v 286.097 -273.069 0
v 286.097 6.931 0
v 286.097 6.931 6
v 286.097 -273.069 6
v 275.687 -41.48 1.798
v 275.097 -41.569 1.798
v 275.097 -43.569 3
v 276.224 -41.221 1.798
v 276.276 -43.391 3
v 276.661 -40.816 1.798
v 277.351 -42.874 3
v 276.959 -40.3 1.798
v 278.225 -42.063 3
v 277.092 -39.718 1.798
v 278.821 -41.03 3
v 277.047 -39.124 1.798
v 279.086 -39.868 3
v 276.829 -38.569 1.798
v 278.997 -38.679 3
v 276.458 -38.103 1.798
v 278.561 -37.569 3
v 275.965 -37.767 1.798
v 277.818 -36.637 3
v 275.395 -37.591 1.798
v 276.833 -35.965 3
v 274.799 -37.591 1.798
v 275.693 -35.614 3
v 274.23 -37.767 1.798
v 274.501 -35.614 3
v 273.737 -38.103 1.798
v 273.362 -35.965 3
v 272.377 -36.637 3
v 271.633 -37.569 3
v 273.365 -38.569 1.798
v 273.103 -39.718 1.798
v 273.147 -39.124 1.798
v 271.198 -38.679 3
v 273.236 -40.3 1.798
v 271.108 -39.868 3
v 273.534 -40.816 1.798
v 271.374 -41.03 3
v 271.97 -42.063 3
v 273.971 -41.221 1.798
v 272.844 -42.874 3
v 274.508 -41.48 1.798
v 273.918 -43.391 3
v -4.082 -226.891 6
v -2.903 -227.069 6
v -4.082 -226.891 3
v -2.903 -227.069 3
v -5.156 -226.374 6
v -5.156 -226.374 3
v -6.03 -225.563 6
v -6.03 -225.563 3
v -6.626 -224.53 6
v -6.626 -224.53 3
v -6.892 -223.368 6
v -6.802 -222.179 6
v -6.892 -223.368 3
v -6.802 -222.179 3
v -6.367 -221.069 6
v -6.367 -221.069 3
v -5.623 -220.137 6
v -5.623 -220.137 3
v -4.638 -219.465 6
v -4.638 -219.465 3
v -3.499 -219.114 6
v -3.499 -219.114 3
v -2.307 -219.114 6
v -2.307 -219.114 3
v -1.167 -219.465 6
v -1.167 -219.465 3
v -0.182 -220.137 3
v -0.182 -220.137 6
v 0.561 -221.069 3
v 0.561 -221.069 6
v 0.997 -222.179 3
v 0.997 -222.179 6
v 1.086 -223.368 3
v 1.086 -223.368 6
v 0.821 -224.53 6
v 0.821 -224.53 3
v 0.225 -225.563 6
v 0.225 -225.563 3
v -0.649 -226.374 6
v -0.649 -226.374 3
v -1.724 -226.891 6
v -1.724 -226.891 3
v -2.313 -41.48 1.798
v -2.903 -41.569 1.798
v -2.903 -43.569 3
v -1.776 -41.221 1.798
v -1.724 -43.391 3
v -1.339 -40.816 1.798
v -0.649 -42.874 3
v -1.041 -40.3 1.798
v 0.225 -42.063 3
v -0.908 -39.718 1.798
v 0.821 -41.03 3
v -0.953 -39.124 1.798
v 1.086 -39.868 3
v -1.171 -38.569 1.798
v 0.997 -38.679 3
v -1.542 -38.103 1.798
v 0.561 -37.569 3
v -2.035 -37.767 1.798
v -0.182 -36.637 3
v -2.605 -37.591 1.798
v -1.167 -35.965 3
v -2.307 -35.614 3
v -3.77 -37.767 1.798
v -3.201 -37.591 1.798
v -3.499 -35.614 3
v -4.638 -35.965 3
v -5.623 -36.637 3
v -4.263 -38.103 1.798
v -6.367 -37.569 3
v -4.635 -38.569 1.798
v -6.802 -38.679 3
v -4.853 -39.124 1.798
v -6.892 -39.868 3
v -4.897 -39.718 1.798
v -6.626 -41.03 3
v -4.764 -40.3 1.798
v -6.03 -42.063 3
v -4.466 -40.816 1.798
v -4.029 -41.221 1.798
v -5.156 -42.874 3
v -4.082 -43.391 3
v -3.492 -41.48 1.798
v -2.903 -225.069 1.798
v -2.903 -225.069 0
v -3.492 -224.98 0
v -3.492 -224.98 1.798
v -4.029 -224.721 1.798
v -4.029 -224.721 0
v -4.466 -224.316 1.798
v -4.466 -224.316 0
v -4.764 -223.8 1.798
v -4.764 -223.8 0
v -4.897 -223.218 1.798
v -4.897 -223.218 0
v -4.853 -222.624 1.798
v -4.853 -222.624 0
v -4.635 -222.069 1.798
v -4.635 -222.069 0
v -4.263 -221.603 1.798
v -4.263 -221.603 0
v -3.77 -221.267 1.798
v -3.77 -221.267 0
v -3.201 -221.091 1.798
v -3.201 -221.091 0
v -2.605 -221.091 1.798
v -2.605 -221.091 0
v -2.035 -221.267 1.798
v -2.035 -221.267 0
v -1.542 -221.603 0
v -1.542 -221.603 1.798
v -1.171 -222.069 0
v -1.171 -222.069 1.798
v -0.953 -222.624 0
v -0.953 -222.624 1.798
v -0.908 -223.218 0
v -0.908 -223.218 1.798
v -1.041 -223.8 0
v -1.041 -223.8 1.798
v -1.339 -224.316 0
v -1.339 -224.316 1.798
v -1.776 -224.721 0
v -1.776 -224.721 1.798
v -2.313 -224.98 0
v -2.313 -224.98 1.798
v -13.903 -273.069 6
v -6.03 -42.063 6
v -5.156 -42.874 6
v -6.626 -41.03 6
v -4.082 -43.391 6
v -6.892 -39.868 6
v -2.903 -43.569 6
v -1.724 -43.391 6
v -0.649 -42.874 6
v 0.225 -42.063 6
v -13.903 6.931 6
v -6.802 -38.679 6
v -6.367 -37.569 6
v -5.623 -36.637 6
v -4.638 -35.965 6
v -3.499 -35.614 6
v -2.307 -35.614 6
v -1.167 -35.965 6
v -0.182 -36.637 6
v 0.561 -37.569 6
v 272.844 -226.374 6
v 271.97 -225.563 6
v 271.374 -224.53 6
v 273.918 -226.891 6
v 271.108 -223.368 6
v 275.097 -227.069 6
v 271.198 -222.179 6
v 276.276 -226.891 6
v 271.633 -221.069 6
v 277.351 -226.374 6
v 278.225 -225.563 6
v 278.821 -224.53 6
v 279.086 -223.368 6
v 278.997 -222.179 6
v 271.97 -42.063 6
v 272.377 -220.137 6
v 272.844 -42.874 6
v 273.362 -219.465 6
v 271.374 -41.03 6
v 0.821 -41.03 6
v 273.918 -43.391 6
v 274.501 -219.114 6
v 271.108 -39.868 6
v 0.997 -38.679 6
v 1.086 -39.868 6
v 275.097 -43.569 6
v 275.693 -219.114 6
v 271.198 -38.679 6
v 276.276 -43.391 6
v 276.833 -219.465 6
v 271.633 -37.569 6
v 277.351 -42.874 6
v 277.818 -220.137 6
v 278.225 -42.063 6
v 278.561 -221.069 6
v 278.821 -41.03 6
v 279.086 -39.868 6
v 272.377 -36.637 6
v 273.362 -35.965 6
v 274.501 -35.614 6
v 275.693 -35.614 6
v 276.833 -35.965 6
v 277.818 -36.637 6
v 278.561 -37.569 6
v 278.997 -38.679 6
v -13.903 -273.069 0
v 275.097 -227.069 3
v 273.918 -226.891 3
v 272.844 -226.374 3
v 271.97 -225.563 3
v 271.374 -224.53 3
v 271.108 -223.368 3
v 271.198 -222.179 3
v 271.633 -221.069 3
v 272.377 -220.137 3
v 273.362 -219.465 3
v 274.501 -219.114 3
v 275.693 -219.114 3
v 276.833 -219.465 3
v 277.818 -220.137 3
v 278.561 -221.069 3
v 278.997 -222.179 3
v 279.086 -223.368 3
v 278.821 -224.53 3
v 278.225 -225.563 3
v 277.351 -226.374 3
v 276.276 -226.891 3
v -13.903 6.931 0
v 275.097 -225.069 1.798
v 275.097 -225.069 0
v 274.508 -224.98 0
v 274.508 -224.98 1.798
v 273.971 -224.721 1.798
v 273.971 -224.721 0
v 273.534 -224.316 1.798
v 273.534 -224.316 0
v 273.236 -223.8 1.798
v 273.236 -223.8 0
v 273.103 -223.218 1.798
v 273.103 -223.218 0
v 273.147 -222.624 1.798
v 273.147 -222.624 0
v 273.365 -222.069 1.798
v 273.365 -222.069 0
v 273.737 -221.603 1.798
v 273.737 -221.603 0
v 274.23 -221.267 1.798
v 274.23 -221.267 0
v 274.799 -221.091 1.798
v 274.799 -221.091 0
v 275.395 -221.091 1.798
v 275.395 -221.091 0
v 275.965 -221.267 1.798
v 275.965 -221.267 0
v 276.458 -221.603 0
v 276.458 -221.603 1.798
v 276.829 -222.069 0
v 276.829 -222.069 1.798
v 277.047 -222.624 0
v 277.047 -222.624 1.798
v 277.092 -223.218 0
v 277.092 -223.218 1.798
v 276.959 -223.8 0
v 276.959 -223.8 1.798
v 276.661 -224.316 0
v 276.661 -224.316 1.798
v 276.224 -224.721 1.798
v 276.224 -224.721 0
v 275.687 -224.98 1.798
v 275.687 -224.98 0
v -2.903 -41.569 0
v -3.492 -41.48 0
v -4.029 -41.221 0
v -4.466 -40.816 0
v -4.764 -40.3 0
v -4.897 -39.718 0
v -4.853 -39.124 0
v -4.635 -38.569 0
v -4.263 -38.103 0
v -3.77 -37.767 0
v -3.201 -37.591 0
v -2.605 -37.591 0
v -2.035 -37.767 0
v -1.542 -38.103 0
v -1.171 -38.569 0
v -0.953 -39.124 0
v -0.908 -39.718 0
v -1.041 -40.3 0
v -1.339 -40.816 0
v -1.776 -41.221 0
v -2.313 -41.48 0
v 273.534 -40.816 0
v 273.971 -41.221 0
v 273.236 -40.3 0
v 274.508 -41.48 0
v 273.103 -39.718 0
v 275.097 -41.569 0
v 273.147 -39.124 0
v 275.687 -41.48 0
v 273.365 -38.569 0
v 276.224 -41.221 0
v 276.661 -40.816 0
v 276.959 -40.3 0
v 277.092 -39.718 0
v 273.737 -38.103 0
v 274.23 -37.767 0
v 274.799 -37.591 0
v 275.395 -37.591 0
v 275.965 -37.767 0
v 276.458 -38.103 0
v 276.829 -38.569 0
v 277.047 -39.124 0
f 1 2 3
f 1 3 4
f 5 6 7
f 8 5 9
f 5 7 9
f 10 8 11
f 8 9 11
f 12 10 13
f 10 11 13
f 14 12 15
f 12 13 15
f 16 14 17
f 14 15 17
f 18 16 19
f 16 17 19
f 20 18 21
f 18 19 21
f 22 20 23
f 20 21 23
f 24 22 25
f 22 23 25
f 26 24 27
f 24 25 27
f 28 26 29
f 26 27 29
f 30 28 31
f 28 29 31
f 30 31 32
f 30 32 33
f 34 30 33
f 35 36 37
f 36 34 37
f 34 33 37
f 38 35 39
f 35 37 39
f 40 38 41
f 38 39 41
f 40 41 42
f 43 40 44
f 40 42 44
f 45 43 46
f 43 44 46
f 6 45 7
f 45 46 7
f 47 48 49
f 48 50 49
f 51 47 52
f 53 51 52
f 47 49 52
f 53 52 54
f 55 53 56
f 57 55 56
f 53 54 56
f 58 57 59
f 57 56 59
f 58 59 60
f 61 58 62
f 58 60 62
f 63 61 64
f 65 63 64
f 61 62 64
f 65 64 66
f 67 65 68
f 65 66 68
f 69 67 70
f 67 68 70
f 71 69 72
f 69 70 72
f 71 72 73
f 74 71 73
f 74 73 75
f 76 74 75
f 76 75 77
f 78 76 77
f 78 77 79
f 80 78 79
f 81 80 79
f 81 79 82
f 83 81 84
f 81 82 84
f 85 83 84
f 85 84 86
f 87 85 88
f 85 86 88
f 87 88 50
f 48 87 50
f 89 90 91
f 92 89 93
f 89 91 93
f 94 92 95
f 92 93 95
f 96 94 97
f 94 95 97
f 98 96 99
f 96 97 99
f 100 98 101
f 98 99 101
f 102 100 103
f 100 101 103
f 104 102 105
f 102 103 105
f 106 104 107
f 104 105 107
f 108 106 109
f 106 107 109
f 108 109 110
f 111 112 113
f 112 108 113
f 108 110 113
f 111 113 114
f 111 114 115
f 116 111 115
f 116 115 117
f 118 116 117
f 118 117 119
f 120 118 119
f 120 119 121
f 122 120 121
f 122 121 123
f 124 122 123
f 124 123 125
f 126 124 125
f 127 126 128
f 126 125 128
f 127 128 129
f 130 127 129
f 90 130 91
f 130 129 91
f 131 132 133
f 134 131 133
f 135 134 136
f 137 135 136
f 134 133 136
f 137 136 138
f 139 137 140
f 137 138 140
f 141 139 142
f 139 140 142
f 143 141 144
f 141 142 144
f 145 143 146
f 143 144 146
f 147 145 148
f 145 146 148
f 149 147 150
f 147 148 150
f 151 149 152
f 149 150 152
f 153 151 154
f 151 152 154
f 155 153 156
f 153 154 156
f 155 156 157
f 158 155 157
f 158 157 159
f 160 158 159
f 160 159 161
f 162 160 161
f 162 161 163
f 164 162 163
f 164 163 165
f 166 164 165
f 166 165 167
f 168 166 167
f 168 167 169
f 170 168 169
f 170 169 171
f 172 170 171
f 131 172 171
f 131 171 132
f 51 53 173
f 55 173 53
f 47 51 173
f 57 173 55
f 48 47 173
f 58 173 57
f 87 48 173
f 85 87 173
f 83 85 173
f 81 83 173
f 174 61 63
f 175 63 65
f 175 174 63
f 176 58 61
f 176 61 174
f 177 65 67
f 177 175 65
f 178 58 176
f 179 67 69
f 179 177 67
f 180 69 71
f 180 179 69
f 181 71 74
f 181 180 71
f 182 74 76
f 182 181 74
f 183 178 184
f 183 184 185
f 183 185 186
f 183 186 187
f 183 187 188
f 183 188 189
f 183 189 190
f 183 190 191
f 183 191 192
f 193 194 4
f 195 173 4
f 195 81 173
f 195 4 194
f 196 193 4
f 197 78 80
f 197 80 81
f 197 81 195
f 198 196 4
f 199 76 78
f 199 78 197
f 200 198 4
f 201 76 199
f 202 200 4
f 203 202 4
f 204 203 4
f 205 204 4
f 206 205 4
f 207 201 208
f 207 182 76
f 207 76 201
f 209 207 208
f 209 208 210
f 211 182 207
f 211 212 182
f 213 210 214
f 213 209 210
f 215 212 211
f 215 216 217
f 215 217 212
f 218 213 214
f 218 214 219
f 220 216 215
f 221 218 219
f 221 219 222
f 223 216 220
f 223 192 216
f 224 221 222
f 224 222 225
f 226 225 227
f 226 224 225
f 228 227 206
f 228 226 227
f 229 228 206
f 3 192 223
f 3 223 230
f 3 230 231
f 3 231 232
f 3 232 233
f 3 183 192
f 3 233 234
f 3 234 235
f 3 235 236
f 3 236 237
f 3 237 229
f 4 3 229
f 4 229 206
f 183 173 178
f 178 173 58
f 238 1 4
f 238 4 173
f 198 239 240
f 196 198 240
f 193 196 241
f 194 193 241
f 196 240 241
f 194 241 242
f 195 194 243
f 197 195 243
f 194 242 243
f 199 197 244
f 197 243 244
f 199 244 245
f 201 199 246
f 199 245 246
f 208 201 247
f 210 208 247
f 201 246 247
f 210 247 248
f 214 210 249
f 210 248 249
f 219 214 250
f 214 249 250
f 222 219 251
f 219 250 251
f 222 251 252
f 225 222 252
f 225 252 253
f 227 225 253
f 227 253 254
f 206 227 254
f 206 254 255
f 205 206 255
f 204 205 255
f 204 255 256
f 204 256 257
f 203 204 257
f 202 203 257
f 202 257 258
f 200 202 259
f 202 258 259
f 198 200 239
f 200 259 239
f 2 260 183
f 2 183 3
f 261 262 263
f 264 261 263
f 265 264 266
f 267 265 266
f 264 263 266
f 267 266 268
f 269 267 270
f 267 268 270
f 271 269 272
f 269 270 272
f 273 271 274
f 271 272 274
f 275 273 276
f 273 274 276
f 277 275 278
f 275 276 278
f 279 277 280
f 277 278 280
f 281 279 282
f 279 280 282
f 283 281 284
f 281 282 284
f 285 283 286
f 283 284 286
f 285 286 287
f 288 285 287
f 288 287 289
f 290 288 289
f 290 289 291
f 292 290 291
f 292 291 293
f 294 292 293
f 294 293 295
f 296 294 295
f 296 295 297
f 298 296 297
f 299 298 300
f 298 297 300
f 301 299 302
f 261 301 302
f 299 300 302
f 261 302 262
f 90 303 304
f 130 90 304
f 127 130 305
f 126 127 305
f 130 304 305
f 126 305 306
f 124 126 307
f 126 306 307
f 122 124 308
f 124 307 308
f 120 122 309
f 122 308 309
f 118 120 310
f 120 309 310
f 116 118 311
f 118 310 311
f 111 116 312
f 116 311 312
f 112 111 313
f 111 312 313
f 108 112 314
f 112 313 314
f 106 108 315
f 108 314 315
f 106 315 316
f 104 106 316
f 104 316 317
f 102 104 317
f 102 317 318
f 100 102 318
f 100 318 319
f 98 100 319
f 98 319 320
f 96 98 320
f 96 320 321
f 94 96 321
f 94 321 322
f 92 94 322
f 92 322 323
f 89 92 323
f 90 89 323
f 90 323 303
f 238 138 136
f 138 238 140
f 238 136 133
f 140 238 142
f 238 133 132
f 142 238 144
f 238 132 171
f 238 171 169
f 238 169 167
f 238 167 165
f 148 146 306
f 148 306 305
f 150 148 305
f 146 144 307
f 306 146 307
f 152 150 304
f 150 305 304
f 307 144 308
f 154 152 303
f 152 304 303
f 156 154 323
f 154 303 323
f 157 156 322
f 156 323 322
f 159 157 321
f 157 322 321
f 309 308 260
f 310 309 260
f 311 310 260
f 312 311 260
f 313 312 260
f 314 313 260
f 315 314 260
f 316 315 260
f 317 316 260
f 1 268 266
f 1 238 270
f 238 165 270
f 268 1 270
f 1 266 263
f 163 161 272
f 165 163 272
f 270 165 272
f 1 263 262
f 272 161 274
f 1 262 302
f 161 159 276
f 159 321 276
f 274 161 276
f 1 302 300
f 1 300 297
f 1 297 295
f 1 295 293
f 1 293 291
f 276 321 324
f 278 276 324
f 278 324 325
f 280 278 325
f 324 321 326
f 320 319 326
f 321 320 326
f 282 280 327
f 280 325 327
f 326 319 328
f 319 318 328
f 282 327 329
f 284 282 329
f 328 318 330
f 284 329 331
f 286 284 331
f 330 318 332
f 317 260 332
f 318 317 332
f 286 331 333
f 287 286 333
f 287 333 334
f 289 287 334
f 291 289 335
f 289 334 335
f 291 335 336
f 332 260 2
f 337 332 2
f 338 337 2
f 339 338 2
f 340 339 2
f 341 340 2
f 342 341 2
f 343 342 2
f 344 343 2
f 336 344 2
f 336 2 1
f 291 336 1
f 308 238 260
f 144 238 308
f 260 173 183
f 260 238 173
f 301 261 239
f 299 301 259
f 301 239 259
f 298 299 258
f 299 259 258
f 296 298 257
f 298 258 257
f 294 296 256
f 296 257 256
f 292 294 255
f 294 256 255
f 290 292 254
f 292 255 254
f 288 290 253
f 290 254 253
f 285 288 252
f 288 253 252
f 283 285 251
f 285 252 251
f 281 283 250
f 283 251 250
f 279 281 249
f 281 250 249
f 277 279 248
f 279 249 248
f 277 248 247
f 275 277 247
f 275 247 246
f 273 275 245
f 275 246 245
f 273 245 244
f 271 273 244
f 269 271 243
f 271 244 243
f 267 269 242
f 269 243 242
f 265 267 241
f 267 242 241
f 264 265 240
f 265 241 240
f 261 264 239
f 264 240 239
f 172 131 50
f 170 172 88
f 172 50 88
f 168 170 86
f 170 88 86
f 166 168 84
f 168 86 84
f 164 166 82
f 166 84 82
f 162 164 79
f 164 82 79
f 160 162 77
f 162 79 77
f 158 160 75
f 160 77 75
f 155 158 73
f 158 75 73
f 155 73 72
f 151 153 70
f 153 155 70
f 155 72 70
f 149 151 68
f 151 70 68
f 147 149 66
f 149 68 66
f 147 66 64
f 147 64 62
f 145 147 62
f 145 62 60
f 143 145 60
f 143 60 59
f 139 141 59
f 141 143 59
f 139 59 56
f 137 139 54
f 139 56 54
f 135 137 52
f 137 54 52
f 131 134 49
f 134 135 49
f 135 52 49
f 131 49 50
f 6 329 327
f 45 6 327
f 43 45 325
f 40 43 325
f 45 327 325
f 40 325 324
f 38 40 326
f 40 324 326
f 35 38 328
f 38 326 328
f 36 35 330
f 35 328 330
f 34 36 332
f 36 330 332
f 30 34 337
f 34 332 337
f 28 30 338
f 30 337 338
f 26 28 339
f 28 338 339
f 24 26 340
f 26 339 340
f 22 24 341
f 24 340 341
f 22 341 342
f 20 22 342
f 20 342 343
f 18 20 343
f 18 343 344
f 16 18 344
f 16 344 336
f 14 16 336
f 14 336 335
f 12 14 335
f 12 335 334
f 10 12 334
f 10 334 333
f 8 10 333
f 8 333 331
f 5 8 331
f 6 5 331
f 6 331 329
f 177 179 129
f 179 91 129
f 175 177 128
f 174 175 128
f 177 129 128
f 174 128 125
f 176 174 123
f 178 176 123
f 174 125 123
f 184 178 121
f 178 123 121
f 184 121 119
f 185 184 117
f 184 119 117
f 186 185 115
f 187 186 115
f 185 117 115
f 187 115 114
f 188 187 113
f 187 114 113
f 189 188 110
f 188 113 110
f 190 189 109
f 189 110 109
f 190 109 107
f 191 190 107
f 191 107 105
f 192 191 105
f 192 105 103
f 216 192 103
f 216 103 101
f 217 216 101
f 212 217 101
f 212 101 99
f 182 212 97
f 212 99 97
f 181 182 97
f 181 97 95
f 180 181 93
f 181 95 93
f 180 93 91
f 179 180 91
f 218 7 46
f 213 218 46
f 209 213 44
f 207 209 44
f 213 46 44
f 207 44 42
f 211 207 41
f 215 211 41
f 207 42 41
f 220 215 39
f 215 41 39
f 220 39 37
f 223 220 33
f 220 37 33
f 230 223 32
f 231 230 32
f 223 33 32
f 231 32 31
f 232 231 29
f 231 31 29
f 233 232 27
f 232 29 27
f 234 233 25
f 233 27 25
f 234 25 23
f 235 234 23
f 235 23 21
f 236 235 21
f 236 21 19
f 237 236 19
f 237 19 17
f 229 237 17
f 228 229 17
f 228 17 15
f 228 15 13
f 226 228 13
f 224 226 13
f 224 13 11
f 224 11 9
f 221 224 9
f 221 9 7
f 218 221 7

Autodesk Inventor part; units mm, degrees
ref_plane "YZ Plane" through (0, 0, 0) normal (1, 0, 0) x (0, 1, 0)
ref_plane "XZ Plane" through (0, 0, 0) normal (0, 1, 0) x (-1, 0, 0)
ref_plane "XY Plane" through (0, 0, 0) normal (0, 0, 1) x (1, 0, 0)
sketch "Szkic1" plane through (0, 0, 0) normal (0, 0, 1) x (1, 0, 0)
  line L0 (-13.9027, 6.9311) -> (286.0973, 6.9311)
  line L1 (286.0973, 6.9311) -> (286.0973, -273.0689)
  line L2 (286.0973, -273.0689) -> (-13.9027, -273.0689)
  line L3 (-13.9027, -273.0689) -> (-13.9027, 6.9311)
  point P0 (0, 0)
  dimension "d0" = 300
  dimension "d1" = 280
extrude "Wyciągnięcie proste1" add sketch "Szkic1" along normal blind 6
sketch "Szkic2" plane through (0, 0, 6) normal (0, 0, 1) x (1, 0, 0)
  line L0 (286.0973, 6.9311) -> (-13.9027, 6.9311) projected
  line L1 (-13.9027, 6.9311) -> (-13.9027, -273.0689) projected
  line L2 (-13.9027, -273.0689) -> (286.0973, -273.0689) projected
  line L3 (286.0973, -273.0689) -> (286.0973, 6.9311) projected
  point P0 (0, 0)
  point P1 (-2.9027, -39.5689)
  point P2 (275.0973, -39.5689)
  point P3 (-2.9027, -223.0689)
  point P4 (275.0973, -223.0689)
  dimension "d4" = 46.5
  dimension "d5" = 300
  dimension "d6" = 46.5
  dimension "d7" = 11
  dimension "d8" = 11
  dimension "d9" = 50
  dimension "d10" = 50
  dimension "d11" = 11
  dimension "d12" = 11
hole "Otwór1" at (-2.9027, -39.5689, 6) at (275.0973, -39.5689, 6) at (-2.9027, -223.0689, 6) at (275.0973, -223.0689, 6) direction (0, 0, -1) diameter 4 end through all
hole "Otwór2" at (-2.9027, -39.5689, 6) at (275.0973, -39.5689, 6) at (-2.9027, -223.0689, 6) at (275.0973, -223.0689, 6) direction (0, 0, -1) diameter 8 depth 3 tip angle 118
equation "\"d6\" = d4"
equation "\"d7\" = d8"
equation "\"d11\" = d8"
equation "\"d12\" = d8"
properties part number "CNCM_ALU_6mm_Heatbed"
